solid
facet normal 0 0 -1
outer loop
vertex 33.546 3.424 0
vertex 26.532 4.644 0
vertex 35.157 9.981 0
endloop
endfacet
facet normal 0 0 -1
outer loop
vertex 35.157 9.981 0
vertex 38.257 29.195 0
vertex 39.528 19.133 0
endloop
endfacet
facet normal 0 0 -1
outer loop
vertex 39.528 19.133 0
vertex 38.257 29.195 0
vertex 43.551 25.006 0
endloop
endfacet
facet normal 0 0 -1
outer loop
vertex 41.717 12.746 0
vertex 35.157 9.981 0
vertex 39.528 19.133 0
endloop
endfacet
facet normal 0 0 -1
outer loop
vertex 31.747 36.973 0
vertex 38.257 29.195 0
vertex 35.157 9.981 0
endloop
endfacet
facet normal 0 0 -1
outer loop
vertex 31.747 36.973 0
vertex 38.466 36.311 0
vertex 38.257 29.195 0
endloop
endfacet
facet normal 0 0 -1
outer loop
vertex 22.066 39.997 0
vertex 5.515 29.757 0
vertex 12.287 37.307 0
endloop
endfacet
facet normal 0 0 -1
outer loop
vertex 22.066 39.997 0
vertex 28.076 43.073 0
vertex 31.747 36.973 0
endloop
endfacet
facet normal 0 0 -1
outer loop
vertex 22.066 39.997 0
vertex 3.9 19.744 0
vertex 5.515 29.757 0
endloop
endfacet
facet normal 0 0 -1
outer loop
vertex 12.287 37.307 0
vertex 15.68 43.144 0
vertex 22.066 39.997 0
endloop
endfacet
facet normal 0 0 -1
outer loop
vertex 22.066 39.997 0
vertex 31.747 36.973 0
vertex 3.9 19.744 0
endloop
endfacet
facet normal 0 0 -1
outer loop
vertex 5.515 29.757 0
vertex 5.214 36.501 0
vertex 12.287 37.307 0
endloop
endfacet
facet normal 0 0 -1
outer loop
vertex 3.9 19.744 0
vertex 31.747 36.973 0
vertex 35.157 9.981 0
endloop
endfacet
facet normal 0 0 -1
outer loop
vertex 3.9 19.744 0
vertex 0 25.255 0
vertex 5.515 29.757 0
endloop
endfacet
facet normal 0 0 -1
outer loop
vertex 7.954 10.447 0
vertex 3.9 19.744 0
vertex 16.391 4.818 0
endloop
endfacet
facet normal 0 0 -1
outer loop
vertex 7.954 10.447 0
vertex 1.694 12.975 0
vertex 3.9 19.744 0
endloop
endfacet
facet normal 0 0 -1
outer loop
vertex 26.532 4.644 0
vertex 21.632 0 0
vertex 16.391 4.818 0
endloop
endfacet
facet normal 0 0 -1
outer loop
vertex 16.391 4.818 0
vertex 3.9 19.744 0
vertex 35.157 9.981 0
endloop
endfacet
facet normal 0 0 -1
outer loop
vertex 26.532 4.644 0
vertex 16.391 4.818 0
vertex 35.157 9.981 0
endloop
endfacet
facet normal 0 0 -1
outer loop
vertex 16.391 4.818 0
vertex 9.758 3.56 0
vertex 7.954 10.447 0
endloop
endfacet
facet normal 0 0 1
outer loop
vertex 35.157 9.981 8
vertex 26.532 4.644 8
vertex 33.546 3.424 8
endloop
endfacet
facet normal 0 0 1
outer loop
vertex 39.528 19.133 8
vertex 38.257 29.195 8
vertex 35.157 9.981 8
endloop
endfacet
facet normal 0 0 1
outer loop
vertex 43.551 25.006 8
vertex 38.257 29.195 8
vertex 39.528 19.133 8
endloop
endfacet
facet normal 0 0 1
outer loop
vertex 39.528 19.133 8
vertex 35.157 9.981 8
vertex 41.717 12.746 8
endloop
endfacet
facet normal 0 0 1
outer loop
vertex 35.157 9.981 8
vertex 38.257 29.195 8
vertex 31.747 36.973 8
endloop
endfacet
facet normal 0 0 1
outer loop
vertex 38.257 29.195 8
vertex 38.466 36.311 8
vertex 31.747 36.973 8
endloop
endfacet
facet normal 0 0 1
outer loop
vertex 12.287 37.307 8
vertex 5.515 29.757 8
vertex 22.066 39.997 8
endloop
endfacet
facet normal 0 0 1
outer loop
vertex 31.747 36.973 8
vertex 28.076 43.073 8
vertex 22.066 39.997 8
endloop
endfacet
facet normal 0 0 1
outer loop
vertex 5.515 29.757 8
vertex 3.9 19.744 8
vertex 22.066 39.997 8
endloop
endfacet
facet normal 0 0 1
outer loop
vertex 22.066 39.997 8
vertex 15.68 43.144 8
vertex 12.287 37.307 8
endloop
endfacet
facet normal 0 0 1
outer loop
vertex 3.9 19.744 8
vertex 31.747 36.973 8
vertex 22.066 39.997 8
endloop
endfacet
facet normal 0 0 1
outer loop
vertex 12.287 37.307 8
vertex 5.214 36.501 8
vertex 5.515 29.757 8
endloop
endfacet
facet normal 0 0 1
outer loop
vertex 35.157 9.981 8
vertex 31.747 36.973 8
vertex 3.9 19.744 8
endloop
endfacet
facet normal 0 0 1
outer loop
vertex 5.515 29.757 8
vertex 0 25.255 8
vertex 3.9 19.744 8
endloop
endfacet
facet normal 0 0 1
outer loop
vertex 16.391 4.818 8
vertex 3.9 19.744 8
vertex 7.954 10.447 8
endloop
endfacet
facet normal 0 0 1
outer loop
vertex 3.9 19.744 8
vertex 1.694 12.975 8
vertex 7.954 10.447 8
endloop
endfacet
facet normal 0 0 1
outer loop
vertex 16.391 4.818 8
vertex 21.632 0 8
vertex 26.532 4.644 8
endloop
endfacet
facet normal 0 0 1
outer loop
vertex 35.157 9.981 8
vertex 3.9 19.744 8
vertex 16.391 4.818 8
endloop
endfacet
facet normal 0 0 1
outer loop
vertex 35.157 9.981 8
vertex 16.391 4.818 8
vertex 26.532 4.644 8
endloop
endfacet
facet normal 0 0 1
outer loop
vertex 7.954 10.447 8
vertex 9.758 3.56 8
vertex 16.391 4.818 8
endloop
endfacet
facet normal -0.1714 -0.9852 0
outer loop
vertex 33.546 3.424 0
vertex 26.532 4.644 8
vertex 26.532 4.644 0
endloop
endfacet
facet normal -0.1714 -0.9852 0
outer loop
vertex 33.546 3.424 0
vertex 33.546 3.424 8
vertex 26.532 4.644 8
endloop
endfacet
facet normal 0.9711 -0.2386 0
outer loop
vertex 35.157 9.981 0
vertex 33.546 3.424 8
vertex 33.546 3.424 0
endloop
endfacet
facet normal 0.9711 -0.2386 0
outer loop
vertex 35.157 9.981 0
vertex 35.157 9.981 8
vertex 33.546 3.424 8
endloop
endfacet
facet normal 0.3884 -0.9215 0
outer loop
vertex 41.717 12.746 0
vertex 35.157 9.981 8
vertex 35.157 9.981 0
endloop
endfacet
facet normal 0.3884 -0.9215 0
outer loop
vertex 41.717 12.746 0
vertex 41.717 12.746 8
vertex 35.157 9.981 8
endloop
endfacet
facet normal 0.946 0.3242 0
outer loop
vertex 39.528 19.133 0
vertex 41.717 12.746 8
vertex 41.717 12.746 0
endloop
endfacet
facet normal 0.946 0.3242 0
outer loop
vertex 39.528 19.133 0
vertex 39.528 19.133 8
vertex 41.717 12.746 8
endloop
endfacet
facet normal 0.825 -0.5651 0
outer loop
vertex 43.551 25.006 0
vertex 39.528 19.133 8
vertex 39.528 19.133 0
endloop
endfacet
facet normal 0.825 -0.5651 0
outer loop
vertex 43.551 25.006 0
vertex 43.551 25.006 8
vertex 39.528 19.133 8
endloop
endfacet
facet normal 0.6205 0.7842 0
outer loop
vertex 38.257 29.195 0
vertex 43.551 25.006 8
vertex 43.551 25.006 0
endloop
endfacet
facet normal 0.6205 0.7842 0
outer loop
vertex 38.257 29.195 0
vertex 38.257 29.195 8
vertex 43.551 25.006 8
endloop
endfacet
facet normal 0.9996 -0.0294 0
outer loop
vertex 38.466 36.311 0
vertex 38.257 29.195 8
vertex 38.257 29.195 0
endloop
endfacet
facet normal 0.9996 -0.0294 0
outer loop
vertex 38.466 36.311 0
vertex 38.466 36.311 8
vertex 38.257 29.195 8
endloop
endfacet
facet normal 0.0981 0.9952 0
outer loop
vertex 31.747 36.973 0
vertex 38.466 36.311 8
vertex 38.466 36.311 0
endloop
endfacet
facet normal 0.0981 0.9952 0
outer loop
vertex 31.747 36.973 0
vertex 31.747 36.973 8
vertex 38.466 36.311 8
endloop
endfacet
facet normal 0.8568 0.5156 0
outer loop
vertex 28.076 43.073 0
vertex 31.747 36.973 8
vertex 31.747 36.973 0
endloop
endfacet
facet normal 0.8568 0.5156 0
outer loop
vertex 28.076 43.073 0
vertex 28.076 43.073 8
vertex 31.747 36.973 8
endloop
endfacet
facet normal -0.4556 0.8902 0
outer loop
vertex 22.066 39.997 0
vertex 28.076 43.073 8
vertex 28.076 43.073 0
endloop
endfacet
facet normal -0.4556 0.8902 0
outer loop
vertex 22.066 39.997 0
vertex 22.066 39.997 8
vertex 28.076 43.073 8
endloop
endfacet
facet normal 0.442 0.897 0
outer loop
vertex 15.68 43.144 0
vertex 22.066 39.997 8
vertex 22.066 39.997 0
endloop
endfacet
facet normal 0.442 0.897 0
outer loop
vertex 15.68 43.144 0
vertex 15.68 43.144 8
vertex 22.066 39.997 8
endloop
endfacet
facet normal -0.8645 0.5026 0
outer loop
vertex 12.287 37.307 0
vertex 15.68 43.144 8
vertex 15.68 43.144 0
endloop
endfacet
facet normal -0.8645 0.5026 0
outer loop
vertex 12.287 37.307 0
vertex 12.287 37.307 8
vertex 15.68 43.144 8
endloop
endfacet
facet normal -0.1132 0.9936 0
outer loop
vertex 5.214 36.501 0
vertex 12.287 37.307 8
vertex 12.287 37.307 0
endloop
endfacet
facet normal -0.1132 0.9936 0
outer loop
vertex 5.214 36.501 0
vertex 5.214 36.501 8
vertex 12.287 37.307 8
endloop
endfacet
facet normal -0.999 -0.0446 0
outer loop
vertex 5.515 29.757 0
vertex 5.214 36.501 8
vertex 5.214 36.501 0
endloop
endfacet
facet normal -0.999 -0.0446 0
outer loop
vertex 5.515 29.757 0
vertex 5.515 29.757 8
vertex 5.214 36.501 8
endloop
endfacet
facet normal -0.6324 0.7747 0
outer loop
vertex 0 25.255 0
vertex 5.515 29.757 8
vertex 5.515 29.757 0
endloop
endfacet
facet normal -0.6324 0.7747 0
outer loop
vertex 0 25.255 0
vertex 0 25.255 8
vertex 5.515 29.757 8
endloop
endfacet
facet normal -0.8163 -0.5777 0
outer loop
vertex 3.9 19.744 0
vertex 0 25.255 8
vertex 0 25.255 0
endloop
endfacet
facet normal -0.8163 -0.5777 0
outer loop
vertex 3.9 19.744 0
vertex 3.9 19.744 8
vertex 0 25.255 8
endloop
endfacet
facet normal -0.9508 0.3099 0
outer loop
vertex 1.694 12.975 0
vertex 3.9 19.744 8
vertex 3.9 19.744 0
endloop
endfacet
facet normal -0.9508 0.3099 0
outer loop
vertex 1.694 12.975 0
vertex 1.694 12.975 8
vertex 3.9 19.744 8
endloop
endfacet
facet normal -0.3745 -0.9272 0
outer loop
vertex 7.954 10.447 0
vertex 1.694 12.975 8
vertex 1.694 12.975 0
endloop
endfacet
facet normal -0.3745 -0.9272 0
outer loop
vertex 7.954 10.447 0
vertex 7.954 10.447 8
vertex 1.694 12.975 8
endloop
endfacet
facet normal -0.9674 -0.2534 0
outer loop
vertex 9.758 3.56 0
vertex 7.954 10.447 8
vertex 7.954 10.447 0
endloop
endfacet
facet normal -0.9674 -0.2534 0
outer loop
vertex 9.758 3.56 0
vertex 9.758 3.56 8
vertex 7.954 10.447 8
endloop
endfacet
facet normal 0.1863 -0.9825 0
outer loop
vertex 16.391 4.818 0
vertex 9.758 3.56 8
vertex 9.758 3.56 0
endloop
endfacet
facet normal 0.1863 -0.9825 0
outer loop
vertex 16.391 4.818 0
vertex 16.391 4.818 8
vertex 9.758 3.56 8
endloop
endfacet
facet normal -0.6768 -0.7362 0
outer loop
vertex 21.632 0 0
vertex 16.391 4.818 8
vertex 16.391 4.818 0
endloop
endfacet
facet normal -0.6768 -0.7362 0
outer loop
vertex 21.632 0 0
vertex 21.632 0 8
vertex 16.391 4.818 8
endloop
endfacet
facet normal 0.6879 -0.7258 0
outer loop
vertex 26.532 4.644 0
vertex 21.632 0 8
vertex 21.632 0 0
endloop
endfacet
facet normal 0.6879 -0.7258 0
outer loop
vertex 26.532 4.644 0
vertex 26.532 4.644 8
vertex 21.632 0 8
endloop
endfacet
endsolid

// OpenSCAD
$fn = 32;

// ----------------------------------------------------------------------
// Chain sprocket: 11 teeth, 18 mm root radius
// ----------------------------------------------------------------------

// --- parameters (mm) ---
profile_height = 8;       // extrusion height
profile_points = 22;      // points of the closed outline

profile = [[39.528, 19.133], [43.551, 25.006], [38.257, 29.195], [38.466, 36.311], [31.747, 36.973], [28.076, 43.073], [22.066, 39.997], [15.68, 43.144], [12.287, 37.307], [5.214, 36.501], [5.515, 29.757], [0, 25.255], [3.9, 19.744], [1.694, 12.975], [7.954, 10.447], [9.758, 3.56], [16.391, 4.818], [21.632, 0], [26.532, 4.644], [33.546, 3.424], [35.157, 9.981], [41.717, 12.746]];  // single closed polygon, 22 points, counter clockwise

// --- the one profile operation ---
linear_extrude(height = profile_height) polygon(points = profile);
